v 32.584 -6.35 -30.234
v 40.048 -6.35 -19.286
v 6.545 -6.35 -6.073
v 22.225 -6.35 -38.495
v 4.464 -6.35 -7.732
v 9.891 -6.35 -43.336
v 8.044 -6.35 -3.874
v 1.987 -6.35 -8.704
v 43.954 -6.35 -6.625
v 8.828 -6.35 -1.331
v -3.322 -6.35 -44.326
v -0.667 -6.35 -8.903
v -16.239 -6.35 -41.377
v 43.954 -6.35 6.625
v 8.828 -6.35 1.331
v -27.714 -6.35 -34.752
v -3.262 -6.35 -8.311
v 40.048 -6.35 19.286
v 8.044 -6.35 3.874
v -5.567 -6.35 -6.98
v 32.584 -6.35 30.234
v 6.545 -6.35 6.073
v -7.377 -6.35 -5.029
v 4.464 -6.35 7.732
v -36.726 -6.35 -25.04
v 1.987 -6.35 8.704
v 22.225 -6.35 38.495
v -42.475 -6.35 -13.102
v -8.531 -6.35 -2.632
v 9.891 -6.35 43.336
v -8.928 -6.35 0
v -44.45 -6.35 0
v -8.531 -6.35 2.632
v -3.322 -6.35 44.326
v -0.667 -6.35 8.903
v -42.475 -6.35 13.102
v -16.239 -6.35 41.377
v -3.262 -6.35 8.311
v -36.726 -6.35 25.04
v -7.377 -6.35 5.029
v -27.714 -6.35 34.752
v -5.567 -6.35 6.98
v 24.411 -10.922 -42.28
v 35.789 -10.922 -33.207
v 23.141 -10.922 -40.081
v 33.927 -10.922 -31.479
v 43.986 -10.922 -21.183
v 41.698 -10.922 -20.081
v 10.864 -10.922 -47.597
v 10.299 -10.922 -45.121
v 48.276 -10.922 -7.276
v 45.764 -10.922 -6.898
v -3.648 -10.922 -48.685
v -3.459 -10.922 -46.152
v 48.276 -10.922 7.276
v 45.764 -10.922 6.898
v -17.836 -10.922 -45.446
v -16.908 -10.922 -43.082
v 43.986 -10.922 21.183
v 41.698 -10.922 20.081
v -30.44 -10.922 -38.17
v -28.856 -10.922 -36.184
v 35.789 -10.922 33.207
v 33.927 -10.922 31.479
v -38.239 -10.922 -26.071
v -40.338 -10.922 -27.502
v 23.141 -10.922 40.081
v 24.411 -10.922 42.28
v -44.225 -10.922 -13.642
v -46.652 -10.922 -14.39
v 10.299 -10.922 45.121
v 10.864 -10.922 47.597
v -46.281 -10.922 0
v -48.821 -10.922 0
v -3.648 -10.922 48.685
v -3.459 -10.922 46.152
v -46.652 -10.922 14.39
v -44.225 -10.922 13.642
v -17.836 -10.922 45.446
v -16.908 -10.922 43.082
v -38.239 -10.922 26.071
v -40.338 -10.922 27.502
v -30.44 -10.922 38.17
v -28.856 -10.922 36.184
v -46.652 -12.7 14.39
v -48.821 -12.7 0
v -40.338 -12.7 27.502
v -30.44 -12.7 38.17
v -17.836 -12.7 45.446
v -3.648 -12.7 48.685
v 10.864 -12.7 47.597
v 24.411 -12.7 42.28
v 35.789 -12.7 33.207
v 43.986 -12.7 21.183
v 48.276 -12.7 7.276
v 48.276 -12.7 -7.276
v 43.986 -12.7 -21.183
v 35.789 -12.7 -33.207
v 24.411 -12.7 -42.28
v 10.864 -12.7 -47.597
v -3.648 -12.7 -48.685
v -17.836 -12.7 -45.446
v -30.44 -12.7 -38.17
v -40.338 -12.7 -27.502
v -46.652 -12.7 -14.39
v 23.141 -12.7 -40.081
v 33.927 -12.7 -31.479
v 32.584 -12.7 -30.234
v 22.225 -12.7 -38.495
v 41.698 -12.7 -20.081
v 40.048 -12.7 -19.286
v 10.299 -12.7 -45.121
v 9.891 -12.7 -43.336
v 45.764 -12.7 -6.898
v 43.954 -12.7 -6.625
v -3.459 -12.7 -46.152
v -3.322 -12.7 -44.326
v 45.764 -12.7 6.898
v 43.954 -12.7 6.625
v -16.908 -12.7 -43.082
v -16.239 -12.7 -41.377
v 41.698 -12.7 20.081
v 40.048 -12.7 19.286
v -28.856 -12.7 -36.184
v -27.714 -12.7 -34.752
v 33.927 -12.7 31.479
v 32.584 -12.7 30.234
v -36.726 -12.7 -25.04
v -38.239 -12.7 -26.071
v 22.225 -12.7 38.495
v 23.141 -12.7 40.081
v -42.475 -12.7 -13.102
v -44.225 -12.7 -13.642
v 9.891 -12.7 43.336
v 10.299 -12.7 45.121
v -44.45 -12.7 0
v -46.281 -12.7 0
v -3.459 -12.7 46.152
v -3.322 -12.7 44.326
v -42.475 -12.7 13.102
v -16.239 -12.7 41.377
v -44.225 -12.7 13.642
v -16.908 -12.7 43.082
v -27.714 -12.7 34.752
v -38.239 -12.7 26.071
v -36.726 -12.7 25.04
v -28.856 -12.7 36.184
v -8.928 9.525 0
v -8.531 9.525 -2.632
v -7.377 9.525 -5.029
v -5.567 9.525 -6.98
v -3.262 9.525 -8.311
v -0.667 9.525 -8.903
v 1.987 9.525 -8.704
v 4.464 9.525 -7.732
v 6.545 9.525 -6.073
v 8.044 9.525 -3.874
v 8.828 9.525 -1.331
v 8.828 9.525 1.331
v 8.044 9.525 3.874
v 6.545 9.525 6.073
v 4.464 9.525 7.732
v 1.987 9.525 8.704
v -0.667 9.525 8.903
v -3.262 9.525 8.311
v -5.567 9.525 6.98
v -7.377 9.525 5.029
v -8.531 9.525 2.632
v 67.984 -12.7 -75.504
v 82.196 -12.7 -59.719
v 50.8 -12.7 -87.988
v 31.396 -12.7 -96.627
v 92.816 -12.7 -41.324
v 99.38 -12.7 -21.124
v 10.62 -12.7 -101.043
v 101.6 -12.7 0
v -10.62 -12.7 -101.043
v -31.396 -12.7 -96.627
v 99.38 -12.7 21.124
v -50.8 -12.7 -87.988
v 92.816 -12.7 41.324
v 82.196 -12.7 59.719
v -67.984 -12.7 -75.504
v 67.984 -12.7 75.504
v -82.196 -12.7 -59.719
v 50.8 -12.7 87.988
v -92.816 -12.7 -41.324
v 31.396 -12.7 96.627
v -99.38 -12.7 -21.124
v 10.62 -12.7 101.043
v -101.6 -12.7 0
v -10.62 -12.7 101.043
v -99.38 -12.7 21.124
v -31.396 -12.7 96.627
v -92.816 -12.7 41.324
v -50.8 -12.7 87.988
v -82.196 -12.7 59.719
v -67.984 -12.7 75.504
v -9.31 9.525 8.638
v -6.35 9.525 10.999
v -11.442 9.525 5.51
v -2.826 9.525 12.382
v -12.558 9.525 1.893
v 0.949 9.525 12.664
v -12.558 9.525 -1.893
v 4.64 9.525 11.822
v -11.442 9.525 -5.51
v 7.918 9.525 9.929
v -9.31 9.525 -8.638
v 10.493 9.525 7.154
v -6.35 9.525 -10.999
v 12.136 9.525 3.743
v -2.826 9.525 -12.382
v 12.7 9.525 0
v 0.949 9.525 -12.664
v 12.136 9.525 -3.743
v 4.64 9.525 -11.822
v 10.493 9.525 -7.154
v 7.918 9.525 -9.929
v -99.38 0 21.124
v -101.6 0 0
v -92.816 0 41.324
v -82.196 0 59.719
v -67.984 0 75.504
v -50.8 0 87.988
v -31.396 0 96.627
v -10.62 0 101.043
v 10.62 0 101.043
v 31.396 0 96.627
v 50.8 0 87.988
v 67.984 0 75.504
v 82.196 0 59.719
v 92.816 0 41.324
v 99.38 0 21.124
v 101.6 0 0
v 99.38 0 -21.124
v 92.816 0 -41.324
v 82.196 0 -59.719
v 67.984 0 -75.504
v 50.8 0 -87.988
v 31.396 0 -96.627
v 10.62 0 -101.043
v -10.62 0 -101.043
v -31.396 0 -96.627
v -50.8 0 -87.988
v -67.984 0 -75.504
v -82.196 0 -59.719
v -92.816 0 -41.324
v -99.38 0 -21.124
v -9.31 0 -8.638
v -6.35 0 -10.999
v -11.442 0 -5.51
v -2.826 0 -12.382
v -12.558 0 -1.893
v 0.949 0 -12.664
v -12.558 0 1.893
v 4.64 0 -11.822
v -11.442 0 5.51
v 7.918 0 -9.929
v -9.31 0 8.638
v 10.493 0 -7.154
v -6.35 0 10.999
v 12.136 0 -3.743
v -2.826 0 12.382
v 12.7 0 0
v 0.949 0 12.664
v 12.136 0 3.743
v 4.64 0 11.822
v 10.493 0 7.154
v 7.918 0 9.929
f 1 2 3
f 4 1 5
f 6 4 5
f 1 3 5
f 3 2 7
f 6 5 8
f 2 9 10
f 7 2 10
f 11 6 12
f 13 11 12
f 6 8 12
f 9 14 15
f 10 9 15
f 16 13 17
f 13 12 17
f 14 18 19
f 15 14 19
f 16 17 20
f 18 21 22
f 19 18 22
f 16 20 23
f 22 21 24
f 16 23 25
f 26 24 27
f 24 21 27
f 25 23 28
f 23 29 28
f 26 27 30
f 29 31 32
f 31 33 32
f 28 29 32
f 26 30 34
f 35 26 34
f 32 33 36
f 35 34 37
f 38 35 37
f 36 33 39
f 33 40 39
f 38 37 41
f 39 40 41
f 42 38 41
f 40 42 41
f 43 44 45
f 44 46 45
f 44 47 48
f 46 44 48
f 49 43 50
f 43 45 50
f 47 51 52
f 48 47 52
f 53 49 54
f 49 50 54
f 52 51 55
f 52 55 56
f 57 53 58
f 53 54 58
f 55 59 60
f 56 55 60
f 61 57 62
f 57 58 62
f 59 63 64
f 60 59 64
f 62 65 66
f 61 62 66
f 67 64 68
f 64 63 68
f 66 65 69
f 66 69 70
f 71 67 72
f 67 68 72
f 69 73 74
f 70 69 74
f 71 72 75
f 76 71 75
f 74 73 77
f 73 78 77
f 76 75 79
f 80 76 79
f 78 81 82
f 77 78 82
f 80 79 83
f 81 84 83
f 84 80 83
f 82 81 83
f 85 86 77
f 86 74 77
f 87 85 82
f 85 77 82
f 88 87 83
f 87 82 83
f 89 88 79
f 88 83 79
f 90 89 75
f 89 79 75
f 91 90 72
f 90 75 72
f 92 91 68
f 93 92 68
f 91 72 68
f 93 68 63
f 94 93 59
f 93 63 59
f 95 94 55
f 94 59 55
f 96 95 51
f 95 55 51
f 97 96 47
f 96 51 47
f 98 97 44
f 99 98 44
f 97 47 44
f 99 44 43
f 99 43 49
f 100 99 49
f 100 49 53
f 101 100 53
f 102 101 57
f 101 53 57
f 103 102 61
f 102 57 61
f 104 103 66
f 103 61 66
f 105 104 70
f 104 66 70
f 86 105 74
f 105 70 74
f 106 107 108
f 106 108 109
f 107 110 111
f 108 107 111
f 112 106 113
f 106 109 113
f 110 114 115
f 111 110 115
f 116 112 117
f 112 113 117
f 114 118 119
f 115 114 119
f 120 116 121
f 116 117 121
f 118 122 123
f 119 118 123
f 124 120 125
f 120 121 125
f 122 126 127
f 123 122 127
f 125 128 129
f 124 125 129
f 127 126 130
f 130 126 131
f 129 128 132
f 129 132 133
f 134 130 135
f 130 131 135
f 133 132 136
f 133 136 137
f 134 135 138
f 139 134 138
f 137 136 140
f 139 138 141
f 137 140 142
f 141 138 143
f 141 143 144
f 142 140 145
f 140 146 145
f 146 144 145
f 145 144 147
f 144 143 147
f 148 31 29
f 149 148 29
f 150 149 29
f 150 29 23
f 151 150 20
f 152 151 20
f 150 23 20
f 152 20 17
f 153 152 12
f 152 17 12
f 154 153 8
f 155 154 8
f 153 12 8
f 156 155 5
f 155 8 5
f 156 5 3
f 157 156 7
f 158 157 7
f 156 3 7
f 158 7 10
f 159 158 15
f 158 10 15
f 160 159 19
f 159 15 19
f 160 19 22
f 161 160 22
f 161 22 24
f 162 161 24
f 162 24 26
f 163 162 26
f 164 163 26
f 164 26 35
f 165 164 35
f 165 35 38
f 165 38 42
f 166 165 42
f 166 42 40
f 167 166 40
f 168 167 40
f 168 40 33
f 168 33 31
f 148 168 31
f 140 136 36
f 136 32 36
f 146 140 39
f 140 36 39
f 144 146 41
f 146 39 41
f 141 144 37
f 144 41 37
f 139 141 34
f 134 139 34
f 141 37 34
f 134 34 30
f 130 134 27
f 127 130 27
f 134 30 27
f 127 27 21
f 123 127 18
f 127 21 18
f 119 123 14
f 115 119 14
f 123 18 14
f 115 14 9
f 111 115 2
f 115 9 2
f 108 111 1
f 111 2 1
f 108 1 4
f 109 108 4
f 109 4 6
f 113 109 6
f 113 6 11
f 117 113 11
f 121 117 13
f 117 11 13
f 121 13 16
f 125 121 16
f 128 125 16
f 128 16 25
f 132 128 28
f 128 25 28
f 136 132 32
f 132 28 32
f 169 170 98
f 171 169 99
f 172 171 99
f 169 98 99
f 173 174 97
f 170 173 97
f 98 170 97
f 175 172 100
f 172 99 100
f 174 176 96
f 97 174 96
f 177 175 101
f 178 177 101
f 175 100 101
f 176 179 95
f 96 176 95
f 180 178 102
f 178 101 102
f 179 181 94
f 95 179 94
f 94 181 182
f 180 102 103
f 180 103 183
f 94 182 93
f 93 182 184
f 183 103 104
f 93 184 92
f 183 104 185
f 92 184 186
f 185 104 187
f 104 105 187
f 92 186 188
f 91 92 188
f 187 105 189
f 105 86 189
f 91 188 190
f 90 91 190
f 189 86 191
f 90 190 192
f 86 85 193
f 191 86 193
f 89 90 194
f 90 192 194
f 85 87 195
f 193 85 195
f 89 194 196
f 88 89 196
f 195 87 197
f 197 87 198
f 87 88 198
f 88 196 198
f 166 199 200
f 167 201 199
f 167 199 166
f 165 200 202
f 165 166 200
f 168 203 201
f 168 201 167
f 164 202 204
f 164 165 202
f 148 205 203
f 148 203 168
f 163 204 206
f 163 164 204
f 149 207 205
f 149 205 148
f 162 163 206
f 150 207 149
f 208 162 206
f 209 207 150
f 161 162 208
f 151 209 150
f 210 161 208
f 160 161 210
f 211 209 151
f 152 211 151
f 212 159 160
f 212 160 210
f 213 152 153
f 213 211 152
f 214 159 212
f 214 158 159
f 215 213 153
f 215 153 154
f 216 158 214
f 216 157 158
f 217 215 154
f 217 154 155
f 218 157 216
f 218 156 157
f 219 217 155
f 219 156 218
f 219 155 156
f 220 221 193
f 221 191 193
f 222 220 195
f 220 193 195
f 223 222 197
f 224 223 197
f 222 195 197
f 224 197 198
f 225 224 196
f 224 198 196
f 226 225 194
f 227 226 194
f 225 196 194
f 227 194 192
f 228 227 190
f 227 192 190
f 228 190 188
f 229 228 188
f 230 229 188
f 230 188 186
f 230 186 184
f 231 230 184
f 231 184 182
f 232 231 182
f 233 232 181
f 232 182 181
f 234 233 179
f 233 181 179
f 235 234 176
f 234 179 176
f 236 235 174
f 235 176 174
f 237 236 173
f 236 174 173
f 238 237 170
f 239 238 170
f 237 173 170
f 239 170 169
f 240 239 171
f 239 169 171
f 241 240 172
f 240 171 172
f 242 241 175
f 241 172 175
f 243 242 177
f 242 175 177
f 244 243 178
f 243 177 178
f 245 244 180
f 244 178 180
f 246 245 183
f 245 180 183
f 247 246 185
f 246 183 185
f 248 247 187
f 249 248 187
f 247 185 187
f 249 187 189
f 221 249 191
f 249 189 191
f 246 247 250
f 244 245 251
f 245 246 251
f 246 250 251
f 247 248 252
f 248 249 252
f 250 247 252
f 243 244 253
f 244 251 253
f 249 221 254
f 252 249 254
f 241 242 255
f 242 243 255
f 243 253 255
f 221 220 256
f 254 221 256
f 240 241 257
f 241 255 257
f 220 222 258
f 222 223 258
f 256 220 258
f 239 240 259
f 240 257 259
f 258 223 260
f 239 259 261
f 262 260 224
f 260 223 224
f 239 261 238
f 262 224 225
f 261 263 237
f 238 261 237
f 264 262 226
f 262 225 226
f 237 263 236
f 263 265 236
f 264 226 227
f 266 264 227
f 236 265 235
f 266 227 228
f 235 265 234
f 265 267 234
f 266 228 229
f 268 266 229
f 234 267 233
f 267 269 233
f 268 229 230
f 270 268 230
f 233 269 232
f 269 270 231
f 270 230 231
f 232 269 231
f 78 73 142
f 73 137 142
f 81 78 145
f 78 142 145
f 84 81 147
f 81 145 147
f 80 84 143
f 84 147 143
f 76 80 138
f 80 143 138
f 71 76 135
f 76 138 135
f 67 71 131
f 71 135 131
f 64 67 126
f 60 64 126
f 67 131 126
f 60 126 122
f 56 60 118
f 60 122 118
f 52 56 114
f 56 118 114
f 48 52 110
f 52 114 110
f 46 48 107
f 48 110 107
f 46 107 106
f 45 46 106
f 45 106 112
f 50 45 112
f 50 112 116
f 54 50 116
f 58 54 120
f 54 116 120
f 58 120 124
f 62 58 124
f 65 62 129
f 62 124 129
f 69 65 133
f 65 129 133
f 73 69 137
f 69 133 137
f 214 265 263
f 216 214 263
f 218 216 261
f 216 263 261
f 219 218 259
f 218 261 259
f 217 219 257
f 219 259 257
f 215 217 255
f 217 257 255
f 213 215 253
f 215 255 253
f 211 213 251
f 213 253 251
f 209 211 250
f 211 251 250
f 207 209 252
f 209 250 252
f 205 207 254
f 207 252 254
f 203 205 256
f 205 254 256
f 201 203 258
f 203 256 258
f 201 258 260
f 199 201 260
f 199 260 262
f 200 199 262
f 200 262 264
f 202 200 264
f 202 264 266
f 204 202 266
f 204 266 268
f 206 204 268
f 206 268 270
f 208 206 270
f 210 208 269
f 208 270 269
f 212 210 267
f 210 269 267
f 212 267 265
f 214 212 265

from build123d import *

# Parameters (mm, degrees)
SKETCH2_R                         = 12.7
BOSS_EXTRUDE1_DEPTH               = 9.525
PIPE_TAP_DRILL_FOR_1_2_TAP1_D     = 17.8562
PIPE_TAP_DRILL_FOR_1_2_TAP1_DEPTH = 31.75
PIPE_TAP_DRILL_FOR_1_2_TAP1_TIP   = 5.364543693


with BuildPart() as part:
    # Sketch1 → Revolve1 (revolve)
    with BuildSketch(Plane.XY):
        Polygon((-101.6, 0), (-101.6, -12.7), (-48.821281066, -12.7), (-48.821281066, -10.922), (-46.281281066, -10.922), (-46.281281066, -12.7), (-44.45, -12.7), (-44.45, -6.35), (0, -6.35), (0, 0), align=None)
    revolve(axis=Axis((0, -6.35, 0), (0, 1, 0)))

    # Sketch2 → Boss-Extrude1 (add)
    with BuildSketch(Plane(origin=(0, 0, 0), x_dir=(1, 0, 0), z_dir=(0, 1, 0))):
        Circle(SKETCH2_R)
    extrude(amount=BOSS_EXTRUDE1_DEPTH)

    # Pipe Tap Drill for 1/2 Tap1
    with Locations(Plane(origin=(0, 9.525, 0), x_dir=(1, 0, 0), z_dir=(0, 1, 0))):
        with Locations((0, 0)):
            Hole(PIPE_TAP_DRILL_FOR_1_2_TAP1_D / 2, depth=PIPE_TAP_DRILL_FOR_1_2_TAP1_DEPTH)
            with Locations((0, 0, -(PIPE_TAP_DRILL_FOR_1_2_TAP1_DEPTH + PIPE_TAP_DRILL_FOR_1_2_TAP1_TIP / 2))):  # 118° drill point
                Cone(0, PIPE_TAP_DRILL_FOR_1_2_TAP1_D / 2, PIPE_TAP_DRILL_FOR_1_2_TAP1_TIP, mode=Mode.SUBTRACT)


solid = part.part
